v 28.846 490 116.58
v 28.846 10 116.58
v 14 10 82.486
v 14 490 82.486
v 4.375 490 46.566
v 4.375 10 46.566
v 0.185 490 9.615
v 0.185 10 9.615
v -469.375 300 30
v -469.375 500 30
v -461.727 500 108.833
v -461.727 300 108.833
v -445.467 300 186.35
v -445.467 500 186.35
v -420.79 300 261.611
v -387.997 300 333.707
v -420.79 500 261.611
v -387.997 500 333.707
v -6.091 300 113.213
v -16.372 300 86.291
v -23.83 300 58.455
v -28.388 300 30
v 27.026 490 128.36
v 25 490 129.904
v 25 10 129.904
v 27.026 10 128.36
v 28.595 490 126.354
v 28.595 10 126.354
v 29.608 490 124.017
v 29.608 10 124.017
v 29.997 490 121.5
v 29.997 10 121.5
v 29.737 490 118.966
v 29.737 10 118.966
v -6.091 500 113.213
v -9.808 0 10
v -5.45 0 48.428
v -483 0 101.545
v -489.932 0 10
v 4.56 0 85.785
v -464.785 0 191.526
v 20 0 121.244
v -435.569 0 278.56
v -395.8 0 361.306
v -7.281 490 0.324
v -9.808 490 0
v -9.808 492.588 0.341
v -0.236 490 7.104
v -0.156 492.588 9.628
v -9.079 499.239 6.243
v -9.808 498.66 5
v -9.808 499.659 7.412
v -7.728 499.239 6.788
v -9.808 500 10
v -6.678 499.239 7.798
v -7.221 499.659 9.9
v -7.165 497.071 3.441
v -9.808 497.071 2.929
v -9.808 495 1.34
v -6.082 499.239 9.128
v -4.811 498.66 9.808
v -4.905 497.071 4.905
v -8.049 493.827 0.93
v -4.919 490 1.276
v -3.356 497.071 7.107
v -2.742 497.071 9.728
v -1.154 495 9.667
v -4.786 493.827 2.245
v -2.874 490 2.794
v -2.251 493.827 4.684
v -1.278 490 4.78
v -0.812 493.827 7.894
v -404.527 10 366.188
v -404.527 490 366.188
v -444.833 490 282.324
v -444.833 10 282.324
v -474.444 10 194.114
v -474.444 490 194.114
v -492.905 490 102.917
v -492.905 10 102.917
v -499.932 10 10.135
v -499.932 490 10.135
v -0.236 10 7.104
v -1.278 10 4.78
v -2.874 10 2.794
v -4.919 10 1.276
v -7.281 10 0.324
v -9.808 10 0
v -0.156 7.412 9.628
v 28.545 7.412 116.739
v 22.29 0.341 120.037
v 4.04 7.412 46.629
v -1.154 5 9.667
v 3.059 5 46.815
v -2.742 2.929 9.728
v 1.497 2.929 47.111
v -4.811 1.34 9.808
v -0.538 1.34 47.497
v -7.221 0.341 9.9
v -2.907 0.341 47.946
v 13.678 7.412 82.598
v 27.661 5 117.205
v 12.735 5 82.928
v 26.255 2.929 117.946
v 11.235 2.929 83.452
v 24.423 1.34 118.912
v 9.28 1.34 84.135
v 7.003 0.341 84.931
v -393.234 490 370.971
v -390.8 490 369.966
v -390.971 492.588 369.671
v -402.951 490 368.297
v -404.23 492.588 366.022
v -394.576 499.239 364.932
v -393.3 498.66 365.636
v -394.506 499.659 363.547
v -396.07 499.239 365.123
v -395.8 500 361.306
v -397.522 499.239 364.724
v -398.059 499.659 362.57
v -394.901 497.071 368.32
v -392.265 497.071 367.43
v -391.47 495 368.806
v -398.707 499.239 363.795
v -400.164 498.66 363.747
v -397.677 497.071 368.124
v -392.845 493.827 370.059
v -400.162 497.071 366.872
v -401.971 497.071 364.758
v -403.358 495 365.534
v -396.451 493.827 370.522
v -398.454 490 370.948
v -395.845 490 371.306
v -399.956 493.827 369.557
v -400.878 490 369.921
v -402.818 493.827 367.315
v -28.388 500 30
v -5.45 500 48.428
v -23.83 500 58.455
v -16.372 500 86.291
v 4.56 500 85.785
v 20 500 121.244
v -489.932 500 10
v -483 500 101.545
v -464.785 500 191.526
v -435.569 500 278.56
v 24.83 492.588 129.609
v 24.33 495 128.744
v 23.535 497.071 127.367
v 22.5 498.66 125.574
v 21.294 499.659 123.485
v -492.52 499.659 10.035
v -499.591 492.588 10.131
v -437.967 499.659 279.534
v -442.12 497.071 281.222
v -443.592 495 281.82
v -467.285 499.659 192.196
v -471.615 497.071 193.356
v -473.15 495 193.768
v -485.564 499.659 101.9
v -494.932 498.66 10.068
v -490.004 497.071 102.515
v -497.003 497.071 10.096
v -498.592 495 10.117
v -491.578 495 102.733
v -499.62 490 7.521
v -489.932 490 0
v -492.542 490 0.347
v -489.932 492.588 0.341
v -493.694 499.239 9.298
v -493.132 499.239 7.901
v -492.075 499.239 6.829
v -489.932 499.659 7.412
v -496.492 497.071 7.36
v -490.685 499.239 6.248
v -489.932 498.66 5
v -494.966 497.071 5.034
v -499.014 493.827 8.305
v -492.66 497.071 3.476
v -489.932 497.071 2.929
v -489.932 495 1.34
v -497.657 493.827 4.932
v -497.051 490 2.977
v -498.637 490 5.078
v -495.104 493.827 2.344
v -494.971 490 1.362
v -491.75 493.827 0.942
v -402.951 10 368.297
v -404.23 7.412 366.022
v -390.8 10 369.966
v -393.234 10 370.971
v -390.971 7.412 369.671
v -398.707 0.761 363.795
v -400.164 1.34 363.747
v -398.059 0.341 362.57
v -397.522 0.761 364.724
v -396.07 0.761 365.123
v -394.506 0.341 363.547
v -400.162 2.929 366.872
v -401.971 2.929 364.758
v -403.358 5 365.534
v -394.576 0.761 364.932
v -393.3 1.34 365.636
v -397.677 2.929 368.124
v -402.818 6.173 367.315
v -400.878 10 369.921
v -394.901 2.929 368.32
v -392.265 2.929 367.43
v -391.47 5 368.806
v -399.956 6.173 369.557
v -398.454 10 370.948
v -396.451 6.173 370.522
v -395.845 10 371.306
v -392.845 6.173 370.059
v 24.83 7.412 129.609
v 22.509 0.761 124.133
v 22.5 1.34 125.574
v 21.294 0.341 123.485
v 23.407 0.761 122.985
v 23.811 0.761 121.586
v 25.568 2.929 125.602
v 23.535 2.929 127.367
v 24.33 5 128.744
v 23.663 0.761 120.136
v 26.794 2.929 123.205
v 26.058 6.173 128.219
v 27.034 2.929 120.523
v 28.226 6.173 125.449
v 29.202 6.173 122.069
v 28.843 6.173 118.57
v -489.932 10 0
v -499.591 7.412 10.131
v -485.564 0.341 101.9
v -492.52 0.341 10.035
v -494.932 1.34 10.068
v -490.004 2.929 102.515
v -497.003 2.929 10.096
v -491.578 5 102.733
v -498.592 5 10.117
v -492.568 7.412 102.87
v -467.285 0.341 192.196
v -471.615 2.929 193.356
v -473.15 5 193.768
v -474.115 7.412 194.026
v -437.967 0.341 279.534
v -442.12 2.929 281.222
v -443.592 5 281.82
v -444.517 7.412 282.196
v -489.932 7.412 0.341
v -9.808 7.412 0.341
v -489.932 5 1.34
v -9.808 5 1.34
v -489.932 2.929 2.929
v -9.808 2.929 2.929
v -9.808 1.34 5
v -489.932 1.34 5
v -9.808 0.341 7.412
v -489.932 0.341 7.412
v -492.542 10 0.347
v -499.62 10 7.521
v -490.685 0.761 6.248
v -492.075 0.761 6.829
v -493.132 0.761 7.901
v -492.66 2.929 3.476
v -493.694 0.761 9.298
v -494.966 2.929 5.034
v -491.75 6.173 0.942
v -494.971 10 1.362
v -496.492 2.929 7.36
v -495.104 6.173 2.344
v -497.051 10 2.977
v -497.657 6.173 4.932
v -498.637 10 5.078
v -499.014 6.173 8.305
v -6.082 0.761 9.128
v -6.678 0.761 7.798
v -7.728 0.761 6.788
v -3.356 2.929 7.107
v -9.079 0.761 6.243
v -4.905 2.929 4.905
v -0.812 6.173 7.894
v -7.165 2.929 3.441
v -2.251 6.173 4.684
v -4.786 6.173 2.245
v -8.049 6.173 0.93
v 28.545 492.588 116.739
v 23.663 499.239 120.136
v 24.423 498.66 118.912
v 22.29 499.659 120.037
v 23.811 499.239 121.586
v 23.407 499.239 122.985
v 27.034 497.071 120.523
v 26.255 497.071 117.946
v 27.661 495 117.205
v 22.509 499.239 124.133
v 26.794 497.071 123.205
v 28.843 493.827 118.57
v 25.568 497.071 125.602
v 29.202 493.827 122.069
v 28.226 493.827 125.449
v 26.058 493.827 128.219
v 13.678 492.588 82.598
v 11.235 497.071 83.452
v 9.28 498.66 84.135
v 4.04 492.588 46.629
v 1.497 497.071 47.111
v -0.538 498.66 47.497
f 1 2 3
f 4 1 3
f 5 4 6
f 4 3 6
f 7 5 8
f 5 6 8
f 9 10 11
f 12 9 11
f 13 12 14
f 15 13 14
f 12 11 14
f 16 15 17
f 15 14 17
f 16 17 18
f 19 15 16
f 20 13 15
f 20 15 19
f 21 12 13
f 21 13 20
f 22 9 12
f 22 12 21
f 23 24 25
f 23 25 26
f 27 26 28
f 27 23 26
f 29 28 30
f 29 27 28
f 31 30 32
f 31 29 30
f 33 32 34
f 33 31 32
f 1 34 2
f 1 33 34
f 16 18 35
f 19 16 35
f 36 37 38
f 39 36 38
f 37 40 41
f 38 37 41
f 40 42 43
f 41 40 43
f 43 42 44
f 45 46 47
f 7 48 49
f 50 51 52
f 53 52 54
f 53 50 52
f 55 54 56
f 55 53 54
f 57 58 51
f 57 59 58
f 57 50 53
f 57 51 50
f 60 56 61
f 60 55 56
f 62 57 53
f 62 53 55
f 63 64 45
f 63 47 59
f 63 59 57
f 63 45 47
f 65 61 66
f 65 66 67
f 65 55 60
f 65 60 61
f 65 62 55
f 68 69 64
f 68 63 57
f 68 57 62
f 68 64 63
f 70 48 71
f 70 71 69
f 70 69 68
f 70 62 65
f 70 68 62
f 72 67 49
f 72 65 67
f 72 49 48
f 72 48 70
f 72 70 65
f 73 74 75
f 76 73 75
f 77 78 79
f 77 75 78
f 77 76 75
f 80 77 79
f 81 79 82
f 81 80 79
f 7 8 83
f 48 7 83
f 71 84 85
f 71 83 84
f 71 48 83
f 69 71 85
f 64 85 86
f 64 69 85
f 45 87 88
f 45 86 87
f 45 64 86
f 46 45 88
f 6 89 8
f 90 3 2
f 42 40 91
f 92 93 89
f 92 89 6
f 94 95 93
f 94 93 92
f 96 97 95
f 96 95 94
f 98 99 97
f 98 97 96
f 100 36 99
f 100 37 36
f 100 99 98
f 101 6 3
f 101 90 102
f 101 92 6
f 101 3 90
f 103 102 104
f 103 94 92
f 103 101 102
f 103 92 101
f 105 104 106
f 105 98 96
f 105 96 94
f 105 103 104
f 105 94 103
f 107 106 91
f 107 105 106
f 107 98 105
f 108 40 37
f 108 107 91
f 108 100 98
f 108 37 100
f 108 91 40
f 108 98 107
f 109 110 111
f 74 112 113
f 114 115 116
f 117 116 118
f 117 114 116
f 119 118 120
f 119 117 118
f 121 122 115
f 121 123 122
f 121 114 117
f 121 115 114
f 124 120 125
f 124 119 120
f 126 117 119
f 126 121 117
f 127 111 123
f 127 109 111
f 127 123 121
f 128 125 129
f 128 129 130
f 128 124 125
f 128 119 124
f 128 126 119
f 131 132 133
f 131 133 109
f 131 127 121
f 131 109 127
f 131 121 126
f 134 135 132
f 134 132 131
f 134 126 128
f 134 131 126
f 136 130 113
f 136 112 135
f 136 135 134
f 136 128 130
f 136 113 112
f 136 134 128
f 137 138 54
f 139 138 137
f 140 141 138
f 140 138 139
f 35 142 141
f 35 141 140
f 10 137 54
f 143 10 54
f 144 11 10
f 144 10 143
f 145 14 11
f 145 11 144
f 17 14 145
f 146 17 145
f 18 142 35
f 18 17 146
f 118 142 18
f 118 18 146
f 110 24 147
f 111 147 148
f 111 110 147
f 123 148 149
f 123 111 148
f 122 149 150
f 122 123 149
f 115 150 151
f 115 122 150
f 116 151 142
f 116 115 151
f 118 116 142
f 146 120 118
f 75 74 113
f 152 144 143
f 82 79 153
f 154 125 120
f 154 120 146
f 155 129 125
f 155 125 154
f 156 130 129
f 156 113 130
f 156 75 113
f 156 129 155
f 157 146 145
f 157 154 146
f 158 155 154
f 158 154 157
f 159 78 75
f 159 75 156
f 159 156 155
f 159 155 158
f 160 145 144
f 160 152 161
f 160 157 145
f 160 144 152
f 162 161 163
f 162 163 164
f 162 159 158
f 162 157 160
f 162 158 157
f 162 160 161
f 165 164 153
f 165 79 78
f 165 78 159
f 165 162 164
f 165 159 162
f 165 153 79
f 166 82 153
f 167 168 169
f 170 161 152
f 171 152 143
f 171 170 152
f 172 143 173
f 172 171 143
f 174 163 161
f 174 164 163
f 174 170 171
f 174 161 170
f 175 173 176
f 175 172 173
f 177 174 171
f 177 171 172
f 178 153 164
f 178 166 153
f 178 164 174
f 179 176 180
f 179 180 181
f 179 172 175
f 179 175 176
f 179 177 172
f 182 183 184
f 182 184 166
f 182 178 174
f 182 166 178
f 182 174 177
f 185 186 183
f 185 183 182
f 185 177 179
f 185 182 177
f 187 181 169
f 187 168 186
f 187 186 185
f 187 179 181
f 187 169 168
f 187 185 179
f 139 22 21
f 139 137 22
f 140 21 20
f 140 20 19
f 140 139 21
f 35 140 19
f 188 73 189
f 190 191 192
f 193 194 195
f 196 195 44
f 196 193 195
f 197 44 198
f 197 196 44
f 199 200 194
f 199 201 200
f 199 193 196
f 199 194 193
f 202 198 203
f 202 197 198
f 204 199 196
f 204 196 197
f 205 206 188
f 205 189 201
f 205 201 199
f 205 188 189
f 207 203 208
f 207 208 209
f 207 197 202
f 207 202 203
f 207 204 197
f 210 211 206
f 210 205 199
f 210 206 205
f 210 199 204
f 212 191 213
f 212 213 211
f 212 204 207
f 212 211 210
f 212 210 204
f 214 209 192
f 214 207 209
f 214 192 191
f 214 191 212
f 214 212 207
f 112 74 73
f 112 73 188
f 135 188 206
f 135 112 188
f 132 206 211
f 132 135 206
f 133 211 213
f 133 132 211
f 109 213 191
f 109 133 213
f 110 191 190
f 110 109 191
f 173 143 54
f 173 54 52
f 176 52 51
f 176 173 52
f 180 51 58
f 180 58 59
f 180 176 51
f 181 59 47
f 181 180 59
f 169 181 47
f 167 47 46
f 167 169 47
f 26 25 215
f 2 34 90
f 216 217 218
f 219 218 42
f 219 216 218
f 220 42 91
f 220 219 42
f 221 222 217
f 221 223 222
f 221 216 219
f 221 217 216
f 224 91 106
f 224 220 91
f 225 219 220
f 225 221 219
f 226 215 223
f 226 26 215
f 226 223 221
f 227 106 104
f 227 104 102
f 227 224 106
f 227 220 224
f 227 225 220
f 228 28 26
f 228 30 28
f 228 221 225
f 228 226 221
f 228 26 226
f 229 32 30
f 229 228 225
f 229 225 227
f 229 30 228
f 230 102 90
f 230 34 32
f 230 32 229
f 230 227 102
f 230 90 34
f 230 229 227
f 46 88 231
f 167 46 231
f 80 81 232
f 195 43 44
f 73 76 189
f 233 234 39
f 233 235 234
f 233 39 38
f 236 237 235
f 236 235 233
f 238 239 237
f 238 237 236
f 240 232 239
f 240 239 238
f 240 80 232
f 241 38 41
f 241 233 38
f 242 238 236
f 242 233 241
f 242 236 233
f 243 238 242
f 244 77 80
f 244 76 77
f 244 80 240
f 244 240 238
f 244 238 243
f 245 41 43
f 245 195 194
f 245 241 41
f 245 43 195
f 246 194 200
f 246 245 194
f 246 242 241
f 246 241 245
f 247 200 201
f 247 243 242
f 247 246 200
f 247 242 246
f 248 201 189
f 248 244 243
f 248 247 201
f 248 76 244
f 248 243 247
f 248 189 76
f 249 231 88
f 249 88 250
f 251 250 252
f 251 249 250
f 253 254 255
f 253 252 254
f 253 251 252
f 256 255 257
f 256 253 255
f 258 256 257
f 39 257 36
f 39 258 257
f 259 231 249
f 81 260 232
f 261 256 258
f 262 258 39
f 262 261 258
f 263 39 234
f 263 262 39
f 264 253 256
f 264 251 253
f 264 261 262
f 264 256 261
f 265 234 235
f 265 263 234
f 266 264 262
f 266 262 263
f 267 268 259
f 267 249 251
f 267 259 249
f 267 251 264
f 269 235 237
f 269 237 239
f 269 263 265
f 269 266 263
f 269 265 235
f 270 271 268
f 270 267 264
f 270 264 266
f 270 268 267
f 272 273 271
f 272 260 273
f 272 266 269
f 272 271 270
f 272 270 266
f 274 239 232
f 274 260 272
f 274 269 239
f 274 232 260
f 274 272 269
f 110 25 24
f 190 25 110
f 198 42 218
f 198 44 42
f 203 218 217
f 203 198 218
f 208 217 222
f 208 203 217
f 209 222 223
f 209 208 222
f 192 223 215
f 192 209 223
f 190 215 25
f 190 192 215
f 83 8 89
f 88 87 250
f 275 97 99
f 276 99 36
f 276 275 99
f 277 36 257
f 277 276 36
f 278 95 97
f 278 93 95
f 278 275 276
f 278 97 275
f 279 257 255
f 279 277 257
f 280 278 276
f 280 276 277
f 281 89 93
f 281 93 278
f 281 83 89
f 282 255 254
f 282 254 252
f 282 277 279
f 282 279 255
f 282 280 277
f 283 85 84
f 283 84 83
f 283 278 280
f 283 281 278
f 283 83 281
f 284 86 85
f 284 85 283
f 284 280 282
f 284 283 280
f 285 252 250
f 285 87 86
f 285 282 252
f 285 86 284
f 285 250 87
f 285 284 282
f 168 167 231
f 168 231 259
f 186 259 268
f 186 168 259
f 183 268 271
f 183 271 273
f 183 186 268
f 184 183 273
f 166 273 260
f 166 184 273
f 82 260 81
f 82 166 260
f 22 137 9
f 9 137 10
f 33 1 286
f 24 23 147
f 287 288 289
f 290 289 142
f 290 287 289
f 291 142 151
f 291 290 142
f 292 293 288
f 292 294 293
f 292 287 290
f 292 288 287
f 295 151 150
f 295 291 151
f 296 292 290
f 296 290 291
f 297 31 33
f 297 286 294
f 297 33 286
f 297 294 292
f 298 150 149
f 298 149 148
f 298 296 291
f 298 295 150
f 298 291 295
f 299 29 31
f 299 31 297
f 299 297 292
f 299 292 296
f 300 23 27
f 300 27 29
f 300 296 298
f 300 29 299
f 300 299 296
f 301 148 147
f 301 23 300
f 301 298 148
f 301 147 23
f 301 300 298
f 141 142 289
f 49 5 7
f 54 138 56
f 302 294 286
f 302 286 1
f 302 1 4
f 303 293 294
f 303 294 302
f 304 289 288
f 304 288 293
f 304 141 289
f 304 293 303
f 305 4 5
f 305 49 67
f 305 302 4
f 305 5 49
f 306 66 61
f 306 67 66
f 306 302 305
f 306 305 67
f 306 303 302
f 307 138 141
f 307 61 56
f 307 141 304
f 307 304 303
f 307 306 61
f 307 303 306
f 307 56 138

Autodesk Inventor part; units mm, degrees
ref_plane "YZ Plane" through (0, 0, 0) normal (1, 0, 0) x (0, 1, 0)
ref_plane "XZ Plane" through (0, 0, 0) normal (0, 1, 0) x (-1, 0, 0)
ref_plane "XY Plane" through (0, 0, 0) normal (0, 0, 1) x (1, 0, 0)
sketch "Sketch1" plane through (0, 0, 0) normal (0, 1, 0) x (-1, 0, 0)
  line L0 (0, 0) -> (500, 0)
  arc A0 (500, 0) -> (399.5191, 375) centre (-250, 0) ccw
  arc A1 (0, 0) -> (-33.4936, 125) centre (-250, 0) ccw
  line L1 (-33.4936, 125) -> (399.5191, 375)
  line L2 (-404.937, 0) -> (679.6218, 0) projected
  dimension "d1" = 500
  dimension "d2" = 30
  dimension "d10" = 250
extrude "Extrusion1" add sketch "Sketch1" along normal blind 500
sketch "Sketch2" plane through (0, 500, 0) normal (0, 1, 0) x (1, 0, 0)
  arc A0 (0, 0) -> (33.4936, -125) centre (250, 0) ccw projected
  line L0 (33.4936, -125) -> (-399.5191, -375) projected
  arc A1 (-500, 0) -> (-399.5191, -375) centre (250, 0) ccw projected
  line L1 (-500, 0) -> (0, 0) projected
  line L2 (-387.9968, -333.7066) -> (-6.0913, -113.2133)
  arc A2 (-28.3882, -30) -> (-6.0913, -113.2133) centre (250, 0) ccw
  line L3 (-28.3882, -30) -> (-469.3747, -30)
  arc A3 (-469.3747, -30) -> (-387.9968, -333.7066) centre (250, 0) ccw
  dimension "d5" = 30
extrude "Extrusion2" cut sketch "Sketch2" against normal blind 200 contours A3 L3 A2 L2
fillet "Fillet2" radius 10 12 edges at (-183.0127, 500, 250) (8.5185, 0, 64.7048) (0, 250, 0) (8.5185, 500, 64.7048) (33.4936, 250, 125) (-474.4444, 0, 194.1143) (-399.5191, 250, 375) (-474.4444, 500, 194.1143) (-500, 250, 0) (-250, 0, 0) (-250, 500, 0) (-183.0127, 0, 250)
properties part number "angular30" material "Concrete"
